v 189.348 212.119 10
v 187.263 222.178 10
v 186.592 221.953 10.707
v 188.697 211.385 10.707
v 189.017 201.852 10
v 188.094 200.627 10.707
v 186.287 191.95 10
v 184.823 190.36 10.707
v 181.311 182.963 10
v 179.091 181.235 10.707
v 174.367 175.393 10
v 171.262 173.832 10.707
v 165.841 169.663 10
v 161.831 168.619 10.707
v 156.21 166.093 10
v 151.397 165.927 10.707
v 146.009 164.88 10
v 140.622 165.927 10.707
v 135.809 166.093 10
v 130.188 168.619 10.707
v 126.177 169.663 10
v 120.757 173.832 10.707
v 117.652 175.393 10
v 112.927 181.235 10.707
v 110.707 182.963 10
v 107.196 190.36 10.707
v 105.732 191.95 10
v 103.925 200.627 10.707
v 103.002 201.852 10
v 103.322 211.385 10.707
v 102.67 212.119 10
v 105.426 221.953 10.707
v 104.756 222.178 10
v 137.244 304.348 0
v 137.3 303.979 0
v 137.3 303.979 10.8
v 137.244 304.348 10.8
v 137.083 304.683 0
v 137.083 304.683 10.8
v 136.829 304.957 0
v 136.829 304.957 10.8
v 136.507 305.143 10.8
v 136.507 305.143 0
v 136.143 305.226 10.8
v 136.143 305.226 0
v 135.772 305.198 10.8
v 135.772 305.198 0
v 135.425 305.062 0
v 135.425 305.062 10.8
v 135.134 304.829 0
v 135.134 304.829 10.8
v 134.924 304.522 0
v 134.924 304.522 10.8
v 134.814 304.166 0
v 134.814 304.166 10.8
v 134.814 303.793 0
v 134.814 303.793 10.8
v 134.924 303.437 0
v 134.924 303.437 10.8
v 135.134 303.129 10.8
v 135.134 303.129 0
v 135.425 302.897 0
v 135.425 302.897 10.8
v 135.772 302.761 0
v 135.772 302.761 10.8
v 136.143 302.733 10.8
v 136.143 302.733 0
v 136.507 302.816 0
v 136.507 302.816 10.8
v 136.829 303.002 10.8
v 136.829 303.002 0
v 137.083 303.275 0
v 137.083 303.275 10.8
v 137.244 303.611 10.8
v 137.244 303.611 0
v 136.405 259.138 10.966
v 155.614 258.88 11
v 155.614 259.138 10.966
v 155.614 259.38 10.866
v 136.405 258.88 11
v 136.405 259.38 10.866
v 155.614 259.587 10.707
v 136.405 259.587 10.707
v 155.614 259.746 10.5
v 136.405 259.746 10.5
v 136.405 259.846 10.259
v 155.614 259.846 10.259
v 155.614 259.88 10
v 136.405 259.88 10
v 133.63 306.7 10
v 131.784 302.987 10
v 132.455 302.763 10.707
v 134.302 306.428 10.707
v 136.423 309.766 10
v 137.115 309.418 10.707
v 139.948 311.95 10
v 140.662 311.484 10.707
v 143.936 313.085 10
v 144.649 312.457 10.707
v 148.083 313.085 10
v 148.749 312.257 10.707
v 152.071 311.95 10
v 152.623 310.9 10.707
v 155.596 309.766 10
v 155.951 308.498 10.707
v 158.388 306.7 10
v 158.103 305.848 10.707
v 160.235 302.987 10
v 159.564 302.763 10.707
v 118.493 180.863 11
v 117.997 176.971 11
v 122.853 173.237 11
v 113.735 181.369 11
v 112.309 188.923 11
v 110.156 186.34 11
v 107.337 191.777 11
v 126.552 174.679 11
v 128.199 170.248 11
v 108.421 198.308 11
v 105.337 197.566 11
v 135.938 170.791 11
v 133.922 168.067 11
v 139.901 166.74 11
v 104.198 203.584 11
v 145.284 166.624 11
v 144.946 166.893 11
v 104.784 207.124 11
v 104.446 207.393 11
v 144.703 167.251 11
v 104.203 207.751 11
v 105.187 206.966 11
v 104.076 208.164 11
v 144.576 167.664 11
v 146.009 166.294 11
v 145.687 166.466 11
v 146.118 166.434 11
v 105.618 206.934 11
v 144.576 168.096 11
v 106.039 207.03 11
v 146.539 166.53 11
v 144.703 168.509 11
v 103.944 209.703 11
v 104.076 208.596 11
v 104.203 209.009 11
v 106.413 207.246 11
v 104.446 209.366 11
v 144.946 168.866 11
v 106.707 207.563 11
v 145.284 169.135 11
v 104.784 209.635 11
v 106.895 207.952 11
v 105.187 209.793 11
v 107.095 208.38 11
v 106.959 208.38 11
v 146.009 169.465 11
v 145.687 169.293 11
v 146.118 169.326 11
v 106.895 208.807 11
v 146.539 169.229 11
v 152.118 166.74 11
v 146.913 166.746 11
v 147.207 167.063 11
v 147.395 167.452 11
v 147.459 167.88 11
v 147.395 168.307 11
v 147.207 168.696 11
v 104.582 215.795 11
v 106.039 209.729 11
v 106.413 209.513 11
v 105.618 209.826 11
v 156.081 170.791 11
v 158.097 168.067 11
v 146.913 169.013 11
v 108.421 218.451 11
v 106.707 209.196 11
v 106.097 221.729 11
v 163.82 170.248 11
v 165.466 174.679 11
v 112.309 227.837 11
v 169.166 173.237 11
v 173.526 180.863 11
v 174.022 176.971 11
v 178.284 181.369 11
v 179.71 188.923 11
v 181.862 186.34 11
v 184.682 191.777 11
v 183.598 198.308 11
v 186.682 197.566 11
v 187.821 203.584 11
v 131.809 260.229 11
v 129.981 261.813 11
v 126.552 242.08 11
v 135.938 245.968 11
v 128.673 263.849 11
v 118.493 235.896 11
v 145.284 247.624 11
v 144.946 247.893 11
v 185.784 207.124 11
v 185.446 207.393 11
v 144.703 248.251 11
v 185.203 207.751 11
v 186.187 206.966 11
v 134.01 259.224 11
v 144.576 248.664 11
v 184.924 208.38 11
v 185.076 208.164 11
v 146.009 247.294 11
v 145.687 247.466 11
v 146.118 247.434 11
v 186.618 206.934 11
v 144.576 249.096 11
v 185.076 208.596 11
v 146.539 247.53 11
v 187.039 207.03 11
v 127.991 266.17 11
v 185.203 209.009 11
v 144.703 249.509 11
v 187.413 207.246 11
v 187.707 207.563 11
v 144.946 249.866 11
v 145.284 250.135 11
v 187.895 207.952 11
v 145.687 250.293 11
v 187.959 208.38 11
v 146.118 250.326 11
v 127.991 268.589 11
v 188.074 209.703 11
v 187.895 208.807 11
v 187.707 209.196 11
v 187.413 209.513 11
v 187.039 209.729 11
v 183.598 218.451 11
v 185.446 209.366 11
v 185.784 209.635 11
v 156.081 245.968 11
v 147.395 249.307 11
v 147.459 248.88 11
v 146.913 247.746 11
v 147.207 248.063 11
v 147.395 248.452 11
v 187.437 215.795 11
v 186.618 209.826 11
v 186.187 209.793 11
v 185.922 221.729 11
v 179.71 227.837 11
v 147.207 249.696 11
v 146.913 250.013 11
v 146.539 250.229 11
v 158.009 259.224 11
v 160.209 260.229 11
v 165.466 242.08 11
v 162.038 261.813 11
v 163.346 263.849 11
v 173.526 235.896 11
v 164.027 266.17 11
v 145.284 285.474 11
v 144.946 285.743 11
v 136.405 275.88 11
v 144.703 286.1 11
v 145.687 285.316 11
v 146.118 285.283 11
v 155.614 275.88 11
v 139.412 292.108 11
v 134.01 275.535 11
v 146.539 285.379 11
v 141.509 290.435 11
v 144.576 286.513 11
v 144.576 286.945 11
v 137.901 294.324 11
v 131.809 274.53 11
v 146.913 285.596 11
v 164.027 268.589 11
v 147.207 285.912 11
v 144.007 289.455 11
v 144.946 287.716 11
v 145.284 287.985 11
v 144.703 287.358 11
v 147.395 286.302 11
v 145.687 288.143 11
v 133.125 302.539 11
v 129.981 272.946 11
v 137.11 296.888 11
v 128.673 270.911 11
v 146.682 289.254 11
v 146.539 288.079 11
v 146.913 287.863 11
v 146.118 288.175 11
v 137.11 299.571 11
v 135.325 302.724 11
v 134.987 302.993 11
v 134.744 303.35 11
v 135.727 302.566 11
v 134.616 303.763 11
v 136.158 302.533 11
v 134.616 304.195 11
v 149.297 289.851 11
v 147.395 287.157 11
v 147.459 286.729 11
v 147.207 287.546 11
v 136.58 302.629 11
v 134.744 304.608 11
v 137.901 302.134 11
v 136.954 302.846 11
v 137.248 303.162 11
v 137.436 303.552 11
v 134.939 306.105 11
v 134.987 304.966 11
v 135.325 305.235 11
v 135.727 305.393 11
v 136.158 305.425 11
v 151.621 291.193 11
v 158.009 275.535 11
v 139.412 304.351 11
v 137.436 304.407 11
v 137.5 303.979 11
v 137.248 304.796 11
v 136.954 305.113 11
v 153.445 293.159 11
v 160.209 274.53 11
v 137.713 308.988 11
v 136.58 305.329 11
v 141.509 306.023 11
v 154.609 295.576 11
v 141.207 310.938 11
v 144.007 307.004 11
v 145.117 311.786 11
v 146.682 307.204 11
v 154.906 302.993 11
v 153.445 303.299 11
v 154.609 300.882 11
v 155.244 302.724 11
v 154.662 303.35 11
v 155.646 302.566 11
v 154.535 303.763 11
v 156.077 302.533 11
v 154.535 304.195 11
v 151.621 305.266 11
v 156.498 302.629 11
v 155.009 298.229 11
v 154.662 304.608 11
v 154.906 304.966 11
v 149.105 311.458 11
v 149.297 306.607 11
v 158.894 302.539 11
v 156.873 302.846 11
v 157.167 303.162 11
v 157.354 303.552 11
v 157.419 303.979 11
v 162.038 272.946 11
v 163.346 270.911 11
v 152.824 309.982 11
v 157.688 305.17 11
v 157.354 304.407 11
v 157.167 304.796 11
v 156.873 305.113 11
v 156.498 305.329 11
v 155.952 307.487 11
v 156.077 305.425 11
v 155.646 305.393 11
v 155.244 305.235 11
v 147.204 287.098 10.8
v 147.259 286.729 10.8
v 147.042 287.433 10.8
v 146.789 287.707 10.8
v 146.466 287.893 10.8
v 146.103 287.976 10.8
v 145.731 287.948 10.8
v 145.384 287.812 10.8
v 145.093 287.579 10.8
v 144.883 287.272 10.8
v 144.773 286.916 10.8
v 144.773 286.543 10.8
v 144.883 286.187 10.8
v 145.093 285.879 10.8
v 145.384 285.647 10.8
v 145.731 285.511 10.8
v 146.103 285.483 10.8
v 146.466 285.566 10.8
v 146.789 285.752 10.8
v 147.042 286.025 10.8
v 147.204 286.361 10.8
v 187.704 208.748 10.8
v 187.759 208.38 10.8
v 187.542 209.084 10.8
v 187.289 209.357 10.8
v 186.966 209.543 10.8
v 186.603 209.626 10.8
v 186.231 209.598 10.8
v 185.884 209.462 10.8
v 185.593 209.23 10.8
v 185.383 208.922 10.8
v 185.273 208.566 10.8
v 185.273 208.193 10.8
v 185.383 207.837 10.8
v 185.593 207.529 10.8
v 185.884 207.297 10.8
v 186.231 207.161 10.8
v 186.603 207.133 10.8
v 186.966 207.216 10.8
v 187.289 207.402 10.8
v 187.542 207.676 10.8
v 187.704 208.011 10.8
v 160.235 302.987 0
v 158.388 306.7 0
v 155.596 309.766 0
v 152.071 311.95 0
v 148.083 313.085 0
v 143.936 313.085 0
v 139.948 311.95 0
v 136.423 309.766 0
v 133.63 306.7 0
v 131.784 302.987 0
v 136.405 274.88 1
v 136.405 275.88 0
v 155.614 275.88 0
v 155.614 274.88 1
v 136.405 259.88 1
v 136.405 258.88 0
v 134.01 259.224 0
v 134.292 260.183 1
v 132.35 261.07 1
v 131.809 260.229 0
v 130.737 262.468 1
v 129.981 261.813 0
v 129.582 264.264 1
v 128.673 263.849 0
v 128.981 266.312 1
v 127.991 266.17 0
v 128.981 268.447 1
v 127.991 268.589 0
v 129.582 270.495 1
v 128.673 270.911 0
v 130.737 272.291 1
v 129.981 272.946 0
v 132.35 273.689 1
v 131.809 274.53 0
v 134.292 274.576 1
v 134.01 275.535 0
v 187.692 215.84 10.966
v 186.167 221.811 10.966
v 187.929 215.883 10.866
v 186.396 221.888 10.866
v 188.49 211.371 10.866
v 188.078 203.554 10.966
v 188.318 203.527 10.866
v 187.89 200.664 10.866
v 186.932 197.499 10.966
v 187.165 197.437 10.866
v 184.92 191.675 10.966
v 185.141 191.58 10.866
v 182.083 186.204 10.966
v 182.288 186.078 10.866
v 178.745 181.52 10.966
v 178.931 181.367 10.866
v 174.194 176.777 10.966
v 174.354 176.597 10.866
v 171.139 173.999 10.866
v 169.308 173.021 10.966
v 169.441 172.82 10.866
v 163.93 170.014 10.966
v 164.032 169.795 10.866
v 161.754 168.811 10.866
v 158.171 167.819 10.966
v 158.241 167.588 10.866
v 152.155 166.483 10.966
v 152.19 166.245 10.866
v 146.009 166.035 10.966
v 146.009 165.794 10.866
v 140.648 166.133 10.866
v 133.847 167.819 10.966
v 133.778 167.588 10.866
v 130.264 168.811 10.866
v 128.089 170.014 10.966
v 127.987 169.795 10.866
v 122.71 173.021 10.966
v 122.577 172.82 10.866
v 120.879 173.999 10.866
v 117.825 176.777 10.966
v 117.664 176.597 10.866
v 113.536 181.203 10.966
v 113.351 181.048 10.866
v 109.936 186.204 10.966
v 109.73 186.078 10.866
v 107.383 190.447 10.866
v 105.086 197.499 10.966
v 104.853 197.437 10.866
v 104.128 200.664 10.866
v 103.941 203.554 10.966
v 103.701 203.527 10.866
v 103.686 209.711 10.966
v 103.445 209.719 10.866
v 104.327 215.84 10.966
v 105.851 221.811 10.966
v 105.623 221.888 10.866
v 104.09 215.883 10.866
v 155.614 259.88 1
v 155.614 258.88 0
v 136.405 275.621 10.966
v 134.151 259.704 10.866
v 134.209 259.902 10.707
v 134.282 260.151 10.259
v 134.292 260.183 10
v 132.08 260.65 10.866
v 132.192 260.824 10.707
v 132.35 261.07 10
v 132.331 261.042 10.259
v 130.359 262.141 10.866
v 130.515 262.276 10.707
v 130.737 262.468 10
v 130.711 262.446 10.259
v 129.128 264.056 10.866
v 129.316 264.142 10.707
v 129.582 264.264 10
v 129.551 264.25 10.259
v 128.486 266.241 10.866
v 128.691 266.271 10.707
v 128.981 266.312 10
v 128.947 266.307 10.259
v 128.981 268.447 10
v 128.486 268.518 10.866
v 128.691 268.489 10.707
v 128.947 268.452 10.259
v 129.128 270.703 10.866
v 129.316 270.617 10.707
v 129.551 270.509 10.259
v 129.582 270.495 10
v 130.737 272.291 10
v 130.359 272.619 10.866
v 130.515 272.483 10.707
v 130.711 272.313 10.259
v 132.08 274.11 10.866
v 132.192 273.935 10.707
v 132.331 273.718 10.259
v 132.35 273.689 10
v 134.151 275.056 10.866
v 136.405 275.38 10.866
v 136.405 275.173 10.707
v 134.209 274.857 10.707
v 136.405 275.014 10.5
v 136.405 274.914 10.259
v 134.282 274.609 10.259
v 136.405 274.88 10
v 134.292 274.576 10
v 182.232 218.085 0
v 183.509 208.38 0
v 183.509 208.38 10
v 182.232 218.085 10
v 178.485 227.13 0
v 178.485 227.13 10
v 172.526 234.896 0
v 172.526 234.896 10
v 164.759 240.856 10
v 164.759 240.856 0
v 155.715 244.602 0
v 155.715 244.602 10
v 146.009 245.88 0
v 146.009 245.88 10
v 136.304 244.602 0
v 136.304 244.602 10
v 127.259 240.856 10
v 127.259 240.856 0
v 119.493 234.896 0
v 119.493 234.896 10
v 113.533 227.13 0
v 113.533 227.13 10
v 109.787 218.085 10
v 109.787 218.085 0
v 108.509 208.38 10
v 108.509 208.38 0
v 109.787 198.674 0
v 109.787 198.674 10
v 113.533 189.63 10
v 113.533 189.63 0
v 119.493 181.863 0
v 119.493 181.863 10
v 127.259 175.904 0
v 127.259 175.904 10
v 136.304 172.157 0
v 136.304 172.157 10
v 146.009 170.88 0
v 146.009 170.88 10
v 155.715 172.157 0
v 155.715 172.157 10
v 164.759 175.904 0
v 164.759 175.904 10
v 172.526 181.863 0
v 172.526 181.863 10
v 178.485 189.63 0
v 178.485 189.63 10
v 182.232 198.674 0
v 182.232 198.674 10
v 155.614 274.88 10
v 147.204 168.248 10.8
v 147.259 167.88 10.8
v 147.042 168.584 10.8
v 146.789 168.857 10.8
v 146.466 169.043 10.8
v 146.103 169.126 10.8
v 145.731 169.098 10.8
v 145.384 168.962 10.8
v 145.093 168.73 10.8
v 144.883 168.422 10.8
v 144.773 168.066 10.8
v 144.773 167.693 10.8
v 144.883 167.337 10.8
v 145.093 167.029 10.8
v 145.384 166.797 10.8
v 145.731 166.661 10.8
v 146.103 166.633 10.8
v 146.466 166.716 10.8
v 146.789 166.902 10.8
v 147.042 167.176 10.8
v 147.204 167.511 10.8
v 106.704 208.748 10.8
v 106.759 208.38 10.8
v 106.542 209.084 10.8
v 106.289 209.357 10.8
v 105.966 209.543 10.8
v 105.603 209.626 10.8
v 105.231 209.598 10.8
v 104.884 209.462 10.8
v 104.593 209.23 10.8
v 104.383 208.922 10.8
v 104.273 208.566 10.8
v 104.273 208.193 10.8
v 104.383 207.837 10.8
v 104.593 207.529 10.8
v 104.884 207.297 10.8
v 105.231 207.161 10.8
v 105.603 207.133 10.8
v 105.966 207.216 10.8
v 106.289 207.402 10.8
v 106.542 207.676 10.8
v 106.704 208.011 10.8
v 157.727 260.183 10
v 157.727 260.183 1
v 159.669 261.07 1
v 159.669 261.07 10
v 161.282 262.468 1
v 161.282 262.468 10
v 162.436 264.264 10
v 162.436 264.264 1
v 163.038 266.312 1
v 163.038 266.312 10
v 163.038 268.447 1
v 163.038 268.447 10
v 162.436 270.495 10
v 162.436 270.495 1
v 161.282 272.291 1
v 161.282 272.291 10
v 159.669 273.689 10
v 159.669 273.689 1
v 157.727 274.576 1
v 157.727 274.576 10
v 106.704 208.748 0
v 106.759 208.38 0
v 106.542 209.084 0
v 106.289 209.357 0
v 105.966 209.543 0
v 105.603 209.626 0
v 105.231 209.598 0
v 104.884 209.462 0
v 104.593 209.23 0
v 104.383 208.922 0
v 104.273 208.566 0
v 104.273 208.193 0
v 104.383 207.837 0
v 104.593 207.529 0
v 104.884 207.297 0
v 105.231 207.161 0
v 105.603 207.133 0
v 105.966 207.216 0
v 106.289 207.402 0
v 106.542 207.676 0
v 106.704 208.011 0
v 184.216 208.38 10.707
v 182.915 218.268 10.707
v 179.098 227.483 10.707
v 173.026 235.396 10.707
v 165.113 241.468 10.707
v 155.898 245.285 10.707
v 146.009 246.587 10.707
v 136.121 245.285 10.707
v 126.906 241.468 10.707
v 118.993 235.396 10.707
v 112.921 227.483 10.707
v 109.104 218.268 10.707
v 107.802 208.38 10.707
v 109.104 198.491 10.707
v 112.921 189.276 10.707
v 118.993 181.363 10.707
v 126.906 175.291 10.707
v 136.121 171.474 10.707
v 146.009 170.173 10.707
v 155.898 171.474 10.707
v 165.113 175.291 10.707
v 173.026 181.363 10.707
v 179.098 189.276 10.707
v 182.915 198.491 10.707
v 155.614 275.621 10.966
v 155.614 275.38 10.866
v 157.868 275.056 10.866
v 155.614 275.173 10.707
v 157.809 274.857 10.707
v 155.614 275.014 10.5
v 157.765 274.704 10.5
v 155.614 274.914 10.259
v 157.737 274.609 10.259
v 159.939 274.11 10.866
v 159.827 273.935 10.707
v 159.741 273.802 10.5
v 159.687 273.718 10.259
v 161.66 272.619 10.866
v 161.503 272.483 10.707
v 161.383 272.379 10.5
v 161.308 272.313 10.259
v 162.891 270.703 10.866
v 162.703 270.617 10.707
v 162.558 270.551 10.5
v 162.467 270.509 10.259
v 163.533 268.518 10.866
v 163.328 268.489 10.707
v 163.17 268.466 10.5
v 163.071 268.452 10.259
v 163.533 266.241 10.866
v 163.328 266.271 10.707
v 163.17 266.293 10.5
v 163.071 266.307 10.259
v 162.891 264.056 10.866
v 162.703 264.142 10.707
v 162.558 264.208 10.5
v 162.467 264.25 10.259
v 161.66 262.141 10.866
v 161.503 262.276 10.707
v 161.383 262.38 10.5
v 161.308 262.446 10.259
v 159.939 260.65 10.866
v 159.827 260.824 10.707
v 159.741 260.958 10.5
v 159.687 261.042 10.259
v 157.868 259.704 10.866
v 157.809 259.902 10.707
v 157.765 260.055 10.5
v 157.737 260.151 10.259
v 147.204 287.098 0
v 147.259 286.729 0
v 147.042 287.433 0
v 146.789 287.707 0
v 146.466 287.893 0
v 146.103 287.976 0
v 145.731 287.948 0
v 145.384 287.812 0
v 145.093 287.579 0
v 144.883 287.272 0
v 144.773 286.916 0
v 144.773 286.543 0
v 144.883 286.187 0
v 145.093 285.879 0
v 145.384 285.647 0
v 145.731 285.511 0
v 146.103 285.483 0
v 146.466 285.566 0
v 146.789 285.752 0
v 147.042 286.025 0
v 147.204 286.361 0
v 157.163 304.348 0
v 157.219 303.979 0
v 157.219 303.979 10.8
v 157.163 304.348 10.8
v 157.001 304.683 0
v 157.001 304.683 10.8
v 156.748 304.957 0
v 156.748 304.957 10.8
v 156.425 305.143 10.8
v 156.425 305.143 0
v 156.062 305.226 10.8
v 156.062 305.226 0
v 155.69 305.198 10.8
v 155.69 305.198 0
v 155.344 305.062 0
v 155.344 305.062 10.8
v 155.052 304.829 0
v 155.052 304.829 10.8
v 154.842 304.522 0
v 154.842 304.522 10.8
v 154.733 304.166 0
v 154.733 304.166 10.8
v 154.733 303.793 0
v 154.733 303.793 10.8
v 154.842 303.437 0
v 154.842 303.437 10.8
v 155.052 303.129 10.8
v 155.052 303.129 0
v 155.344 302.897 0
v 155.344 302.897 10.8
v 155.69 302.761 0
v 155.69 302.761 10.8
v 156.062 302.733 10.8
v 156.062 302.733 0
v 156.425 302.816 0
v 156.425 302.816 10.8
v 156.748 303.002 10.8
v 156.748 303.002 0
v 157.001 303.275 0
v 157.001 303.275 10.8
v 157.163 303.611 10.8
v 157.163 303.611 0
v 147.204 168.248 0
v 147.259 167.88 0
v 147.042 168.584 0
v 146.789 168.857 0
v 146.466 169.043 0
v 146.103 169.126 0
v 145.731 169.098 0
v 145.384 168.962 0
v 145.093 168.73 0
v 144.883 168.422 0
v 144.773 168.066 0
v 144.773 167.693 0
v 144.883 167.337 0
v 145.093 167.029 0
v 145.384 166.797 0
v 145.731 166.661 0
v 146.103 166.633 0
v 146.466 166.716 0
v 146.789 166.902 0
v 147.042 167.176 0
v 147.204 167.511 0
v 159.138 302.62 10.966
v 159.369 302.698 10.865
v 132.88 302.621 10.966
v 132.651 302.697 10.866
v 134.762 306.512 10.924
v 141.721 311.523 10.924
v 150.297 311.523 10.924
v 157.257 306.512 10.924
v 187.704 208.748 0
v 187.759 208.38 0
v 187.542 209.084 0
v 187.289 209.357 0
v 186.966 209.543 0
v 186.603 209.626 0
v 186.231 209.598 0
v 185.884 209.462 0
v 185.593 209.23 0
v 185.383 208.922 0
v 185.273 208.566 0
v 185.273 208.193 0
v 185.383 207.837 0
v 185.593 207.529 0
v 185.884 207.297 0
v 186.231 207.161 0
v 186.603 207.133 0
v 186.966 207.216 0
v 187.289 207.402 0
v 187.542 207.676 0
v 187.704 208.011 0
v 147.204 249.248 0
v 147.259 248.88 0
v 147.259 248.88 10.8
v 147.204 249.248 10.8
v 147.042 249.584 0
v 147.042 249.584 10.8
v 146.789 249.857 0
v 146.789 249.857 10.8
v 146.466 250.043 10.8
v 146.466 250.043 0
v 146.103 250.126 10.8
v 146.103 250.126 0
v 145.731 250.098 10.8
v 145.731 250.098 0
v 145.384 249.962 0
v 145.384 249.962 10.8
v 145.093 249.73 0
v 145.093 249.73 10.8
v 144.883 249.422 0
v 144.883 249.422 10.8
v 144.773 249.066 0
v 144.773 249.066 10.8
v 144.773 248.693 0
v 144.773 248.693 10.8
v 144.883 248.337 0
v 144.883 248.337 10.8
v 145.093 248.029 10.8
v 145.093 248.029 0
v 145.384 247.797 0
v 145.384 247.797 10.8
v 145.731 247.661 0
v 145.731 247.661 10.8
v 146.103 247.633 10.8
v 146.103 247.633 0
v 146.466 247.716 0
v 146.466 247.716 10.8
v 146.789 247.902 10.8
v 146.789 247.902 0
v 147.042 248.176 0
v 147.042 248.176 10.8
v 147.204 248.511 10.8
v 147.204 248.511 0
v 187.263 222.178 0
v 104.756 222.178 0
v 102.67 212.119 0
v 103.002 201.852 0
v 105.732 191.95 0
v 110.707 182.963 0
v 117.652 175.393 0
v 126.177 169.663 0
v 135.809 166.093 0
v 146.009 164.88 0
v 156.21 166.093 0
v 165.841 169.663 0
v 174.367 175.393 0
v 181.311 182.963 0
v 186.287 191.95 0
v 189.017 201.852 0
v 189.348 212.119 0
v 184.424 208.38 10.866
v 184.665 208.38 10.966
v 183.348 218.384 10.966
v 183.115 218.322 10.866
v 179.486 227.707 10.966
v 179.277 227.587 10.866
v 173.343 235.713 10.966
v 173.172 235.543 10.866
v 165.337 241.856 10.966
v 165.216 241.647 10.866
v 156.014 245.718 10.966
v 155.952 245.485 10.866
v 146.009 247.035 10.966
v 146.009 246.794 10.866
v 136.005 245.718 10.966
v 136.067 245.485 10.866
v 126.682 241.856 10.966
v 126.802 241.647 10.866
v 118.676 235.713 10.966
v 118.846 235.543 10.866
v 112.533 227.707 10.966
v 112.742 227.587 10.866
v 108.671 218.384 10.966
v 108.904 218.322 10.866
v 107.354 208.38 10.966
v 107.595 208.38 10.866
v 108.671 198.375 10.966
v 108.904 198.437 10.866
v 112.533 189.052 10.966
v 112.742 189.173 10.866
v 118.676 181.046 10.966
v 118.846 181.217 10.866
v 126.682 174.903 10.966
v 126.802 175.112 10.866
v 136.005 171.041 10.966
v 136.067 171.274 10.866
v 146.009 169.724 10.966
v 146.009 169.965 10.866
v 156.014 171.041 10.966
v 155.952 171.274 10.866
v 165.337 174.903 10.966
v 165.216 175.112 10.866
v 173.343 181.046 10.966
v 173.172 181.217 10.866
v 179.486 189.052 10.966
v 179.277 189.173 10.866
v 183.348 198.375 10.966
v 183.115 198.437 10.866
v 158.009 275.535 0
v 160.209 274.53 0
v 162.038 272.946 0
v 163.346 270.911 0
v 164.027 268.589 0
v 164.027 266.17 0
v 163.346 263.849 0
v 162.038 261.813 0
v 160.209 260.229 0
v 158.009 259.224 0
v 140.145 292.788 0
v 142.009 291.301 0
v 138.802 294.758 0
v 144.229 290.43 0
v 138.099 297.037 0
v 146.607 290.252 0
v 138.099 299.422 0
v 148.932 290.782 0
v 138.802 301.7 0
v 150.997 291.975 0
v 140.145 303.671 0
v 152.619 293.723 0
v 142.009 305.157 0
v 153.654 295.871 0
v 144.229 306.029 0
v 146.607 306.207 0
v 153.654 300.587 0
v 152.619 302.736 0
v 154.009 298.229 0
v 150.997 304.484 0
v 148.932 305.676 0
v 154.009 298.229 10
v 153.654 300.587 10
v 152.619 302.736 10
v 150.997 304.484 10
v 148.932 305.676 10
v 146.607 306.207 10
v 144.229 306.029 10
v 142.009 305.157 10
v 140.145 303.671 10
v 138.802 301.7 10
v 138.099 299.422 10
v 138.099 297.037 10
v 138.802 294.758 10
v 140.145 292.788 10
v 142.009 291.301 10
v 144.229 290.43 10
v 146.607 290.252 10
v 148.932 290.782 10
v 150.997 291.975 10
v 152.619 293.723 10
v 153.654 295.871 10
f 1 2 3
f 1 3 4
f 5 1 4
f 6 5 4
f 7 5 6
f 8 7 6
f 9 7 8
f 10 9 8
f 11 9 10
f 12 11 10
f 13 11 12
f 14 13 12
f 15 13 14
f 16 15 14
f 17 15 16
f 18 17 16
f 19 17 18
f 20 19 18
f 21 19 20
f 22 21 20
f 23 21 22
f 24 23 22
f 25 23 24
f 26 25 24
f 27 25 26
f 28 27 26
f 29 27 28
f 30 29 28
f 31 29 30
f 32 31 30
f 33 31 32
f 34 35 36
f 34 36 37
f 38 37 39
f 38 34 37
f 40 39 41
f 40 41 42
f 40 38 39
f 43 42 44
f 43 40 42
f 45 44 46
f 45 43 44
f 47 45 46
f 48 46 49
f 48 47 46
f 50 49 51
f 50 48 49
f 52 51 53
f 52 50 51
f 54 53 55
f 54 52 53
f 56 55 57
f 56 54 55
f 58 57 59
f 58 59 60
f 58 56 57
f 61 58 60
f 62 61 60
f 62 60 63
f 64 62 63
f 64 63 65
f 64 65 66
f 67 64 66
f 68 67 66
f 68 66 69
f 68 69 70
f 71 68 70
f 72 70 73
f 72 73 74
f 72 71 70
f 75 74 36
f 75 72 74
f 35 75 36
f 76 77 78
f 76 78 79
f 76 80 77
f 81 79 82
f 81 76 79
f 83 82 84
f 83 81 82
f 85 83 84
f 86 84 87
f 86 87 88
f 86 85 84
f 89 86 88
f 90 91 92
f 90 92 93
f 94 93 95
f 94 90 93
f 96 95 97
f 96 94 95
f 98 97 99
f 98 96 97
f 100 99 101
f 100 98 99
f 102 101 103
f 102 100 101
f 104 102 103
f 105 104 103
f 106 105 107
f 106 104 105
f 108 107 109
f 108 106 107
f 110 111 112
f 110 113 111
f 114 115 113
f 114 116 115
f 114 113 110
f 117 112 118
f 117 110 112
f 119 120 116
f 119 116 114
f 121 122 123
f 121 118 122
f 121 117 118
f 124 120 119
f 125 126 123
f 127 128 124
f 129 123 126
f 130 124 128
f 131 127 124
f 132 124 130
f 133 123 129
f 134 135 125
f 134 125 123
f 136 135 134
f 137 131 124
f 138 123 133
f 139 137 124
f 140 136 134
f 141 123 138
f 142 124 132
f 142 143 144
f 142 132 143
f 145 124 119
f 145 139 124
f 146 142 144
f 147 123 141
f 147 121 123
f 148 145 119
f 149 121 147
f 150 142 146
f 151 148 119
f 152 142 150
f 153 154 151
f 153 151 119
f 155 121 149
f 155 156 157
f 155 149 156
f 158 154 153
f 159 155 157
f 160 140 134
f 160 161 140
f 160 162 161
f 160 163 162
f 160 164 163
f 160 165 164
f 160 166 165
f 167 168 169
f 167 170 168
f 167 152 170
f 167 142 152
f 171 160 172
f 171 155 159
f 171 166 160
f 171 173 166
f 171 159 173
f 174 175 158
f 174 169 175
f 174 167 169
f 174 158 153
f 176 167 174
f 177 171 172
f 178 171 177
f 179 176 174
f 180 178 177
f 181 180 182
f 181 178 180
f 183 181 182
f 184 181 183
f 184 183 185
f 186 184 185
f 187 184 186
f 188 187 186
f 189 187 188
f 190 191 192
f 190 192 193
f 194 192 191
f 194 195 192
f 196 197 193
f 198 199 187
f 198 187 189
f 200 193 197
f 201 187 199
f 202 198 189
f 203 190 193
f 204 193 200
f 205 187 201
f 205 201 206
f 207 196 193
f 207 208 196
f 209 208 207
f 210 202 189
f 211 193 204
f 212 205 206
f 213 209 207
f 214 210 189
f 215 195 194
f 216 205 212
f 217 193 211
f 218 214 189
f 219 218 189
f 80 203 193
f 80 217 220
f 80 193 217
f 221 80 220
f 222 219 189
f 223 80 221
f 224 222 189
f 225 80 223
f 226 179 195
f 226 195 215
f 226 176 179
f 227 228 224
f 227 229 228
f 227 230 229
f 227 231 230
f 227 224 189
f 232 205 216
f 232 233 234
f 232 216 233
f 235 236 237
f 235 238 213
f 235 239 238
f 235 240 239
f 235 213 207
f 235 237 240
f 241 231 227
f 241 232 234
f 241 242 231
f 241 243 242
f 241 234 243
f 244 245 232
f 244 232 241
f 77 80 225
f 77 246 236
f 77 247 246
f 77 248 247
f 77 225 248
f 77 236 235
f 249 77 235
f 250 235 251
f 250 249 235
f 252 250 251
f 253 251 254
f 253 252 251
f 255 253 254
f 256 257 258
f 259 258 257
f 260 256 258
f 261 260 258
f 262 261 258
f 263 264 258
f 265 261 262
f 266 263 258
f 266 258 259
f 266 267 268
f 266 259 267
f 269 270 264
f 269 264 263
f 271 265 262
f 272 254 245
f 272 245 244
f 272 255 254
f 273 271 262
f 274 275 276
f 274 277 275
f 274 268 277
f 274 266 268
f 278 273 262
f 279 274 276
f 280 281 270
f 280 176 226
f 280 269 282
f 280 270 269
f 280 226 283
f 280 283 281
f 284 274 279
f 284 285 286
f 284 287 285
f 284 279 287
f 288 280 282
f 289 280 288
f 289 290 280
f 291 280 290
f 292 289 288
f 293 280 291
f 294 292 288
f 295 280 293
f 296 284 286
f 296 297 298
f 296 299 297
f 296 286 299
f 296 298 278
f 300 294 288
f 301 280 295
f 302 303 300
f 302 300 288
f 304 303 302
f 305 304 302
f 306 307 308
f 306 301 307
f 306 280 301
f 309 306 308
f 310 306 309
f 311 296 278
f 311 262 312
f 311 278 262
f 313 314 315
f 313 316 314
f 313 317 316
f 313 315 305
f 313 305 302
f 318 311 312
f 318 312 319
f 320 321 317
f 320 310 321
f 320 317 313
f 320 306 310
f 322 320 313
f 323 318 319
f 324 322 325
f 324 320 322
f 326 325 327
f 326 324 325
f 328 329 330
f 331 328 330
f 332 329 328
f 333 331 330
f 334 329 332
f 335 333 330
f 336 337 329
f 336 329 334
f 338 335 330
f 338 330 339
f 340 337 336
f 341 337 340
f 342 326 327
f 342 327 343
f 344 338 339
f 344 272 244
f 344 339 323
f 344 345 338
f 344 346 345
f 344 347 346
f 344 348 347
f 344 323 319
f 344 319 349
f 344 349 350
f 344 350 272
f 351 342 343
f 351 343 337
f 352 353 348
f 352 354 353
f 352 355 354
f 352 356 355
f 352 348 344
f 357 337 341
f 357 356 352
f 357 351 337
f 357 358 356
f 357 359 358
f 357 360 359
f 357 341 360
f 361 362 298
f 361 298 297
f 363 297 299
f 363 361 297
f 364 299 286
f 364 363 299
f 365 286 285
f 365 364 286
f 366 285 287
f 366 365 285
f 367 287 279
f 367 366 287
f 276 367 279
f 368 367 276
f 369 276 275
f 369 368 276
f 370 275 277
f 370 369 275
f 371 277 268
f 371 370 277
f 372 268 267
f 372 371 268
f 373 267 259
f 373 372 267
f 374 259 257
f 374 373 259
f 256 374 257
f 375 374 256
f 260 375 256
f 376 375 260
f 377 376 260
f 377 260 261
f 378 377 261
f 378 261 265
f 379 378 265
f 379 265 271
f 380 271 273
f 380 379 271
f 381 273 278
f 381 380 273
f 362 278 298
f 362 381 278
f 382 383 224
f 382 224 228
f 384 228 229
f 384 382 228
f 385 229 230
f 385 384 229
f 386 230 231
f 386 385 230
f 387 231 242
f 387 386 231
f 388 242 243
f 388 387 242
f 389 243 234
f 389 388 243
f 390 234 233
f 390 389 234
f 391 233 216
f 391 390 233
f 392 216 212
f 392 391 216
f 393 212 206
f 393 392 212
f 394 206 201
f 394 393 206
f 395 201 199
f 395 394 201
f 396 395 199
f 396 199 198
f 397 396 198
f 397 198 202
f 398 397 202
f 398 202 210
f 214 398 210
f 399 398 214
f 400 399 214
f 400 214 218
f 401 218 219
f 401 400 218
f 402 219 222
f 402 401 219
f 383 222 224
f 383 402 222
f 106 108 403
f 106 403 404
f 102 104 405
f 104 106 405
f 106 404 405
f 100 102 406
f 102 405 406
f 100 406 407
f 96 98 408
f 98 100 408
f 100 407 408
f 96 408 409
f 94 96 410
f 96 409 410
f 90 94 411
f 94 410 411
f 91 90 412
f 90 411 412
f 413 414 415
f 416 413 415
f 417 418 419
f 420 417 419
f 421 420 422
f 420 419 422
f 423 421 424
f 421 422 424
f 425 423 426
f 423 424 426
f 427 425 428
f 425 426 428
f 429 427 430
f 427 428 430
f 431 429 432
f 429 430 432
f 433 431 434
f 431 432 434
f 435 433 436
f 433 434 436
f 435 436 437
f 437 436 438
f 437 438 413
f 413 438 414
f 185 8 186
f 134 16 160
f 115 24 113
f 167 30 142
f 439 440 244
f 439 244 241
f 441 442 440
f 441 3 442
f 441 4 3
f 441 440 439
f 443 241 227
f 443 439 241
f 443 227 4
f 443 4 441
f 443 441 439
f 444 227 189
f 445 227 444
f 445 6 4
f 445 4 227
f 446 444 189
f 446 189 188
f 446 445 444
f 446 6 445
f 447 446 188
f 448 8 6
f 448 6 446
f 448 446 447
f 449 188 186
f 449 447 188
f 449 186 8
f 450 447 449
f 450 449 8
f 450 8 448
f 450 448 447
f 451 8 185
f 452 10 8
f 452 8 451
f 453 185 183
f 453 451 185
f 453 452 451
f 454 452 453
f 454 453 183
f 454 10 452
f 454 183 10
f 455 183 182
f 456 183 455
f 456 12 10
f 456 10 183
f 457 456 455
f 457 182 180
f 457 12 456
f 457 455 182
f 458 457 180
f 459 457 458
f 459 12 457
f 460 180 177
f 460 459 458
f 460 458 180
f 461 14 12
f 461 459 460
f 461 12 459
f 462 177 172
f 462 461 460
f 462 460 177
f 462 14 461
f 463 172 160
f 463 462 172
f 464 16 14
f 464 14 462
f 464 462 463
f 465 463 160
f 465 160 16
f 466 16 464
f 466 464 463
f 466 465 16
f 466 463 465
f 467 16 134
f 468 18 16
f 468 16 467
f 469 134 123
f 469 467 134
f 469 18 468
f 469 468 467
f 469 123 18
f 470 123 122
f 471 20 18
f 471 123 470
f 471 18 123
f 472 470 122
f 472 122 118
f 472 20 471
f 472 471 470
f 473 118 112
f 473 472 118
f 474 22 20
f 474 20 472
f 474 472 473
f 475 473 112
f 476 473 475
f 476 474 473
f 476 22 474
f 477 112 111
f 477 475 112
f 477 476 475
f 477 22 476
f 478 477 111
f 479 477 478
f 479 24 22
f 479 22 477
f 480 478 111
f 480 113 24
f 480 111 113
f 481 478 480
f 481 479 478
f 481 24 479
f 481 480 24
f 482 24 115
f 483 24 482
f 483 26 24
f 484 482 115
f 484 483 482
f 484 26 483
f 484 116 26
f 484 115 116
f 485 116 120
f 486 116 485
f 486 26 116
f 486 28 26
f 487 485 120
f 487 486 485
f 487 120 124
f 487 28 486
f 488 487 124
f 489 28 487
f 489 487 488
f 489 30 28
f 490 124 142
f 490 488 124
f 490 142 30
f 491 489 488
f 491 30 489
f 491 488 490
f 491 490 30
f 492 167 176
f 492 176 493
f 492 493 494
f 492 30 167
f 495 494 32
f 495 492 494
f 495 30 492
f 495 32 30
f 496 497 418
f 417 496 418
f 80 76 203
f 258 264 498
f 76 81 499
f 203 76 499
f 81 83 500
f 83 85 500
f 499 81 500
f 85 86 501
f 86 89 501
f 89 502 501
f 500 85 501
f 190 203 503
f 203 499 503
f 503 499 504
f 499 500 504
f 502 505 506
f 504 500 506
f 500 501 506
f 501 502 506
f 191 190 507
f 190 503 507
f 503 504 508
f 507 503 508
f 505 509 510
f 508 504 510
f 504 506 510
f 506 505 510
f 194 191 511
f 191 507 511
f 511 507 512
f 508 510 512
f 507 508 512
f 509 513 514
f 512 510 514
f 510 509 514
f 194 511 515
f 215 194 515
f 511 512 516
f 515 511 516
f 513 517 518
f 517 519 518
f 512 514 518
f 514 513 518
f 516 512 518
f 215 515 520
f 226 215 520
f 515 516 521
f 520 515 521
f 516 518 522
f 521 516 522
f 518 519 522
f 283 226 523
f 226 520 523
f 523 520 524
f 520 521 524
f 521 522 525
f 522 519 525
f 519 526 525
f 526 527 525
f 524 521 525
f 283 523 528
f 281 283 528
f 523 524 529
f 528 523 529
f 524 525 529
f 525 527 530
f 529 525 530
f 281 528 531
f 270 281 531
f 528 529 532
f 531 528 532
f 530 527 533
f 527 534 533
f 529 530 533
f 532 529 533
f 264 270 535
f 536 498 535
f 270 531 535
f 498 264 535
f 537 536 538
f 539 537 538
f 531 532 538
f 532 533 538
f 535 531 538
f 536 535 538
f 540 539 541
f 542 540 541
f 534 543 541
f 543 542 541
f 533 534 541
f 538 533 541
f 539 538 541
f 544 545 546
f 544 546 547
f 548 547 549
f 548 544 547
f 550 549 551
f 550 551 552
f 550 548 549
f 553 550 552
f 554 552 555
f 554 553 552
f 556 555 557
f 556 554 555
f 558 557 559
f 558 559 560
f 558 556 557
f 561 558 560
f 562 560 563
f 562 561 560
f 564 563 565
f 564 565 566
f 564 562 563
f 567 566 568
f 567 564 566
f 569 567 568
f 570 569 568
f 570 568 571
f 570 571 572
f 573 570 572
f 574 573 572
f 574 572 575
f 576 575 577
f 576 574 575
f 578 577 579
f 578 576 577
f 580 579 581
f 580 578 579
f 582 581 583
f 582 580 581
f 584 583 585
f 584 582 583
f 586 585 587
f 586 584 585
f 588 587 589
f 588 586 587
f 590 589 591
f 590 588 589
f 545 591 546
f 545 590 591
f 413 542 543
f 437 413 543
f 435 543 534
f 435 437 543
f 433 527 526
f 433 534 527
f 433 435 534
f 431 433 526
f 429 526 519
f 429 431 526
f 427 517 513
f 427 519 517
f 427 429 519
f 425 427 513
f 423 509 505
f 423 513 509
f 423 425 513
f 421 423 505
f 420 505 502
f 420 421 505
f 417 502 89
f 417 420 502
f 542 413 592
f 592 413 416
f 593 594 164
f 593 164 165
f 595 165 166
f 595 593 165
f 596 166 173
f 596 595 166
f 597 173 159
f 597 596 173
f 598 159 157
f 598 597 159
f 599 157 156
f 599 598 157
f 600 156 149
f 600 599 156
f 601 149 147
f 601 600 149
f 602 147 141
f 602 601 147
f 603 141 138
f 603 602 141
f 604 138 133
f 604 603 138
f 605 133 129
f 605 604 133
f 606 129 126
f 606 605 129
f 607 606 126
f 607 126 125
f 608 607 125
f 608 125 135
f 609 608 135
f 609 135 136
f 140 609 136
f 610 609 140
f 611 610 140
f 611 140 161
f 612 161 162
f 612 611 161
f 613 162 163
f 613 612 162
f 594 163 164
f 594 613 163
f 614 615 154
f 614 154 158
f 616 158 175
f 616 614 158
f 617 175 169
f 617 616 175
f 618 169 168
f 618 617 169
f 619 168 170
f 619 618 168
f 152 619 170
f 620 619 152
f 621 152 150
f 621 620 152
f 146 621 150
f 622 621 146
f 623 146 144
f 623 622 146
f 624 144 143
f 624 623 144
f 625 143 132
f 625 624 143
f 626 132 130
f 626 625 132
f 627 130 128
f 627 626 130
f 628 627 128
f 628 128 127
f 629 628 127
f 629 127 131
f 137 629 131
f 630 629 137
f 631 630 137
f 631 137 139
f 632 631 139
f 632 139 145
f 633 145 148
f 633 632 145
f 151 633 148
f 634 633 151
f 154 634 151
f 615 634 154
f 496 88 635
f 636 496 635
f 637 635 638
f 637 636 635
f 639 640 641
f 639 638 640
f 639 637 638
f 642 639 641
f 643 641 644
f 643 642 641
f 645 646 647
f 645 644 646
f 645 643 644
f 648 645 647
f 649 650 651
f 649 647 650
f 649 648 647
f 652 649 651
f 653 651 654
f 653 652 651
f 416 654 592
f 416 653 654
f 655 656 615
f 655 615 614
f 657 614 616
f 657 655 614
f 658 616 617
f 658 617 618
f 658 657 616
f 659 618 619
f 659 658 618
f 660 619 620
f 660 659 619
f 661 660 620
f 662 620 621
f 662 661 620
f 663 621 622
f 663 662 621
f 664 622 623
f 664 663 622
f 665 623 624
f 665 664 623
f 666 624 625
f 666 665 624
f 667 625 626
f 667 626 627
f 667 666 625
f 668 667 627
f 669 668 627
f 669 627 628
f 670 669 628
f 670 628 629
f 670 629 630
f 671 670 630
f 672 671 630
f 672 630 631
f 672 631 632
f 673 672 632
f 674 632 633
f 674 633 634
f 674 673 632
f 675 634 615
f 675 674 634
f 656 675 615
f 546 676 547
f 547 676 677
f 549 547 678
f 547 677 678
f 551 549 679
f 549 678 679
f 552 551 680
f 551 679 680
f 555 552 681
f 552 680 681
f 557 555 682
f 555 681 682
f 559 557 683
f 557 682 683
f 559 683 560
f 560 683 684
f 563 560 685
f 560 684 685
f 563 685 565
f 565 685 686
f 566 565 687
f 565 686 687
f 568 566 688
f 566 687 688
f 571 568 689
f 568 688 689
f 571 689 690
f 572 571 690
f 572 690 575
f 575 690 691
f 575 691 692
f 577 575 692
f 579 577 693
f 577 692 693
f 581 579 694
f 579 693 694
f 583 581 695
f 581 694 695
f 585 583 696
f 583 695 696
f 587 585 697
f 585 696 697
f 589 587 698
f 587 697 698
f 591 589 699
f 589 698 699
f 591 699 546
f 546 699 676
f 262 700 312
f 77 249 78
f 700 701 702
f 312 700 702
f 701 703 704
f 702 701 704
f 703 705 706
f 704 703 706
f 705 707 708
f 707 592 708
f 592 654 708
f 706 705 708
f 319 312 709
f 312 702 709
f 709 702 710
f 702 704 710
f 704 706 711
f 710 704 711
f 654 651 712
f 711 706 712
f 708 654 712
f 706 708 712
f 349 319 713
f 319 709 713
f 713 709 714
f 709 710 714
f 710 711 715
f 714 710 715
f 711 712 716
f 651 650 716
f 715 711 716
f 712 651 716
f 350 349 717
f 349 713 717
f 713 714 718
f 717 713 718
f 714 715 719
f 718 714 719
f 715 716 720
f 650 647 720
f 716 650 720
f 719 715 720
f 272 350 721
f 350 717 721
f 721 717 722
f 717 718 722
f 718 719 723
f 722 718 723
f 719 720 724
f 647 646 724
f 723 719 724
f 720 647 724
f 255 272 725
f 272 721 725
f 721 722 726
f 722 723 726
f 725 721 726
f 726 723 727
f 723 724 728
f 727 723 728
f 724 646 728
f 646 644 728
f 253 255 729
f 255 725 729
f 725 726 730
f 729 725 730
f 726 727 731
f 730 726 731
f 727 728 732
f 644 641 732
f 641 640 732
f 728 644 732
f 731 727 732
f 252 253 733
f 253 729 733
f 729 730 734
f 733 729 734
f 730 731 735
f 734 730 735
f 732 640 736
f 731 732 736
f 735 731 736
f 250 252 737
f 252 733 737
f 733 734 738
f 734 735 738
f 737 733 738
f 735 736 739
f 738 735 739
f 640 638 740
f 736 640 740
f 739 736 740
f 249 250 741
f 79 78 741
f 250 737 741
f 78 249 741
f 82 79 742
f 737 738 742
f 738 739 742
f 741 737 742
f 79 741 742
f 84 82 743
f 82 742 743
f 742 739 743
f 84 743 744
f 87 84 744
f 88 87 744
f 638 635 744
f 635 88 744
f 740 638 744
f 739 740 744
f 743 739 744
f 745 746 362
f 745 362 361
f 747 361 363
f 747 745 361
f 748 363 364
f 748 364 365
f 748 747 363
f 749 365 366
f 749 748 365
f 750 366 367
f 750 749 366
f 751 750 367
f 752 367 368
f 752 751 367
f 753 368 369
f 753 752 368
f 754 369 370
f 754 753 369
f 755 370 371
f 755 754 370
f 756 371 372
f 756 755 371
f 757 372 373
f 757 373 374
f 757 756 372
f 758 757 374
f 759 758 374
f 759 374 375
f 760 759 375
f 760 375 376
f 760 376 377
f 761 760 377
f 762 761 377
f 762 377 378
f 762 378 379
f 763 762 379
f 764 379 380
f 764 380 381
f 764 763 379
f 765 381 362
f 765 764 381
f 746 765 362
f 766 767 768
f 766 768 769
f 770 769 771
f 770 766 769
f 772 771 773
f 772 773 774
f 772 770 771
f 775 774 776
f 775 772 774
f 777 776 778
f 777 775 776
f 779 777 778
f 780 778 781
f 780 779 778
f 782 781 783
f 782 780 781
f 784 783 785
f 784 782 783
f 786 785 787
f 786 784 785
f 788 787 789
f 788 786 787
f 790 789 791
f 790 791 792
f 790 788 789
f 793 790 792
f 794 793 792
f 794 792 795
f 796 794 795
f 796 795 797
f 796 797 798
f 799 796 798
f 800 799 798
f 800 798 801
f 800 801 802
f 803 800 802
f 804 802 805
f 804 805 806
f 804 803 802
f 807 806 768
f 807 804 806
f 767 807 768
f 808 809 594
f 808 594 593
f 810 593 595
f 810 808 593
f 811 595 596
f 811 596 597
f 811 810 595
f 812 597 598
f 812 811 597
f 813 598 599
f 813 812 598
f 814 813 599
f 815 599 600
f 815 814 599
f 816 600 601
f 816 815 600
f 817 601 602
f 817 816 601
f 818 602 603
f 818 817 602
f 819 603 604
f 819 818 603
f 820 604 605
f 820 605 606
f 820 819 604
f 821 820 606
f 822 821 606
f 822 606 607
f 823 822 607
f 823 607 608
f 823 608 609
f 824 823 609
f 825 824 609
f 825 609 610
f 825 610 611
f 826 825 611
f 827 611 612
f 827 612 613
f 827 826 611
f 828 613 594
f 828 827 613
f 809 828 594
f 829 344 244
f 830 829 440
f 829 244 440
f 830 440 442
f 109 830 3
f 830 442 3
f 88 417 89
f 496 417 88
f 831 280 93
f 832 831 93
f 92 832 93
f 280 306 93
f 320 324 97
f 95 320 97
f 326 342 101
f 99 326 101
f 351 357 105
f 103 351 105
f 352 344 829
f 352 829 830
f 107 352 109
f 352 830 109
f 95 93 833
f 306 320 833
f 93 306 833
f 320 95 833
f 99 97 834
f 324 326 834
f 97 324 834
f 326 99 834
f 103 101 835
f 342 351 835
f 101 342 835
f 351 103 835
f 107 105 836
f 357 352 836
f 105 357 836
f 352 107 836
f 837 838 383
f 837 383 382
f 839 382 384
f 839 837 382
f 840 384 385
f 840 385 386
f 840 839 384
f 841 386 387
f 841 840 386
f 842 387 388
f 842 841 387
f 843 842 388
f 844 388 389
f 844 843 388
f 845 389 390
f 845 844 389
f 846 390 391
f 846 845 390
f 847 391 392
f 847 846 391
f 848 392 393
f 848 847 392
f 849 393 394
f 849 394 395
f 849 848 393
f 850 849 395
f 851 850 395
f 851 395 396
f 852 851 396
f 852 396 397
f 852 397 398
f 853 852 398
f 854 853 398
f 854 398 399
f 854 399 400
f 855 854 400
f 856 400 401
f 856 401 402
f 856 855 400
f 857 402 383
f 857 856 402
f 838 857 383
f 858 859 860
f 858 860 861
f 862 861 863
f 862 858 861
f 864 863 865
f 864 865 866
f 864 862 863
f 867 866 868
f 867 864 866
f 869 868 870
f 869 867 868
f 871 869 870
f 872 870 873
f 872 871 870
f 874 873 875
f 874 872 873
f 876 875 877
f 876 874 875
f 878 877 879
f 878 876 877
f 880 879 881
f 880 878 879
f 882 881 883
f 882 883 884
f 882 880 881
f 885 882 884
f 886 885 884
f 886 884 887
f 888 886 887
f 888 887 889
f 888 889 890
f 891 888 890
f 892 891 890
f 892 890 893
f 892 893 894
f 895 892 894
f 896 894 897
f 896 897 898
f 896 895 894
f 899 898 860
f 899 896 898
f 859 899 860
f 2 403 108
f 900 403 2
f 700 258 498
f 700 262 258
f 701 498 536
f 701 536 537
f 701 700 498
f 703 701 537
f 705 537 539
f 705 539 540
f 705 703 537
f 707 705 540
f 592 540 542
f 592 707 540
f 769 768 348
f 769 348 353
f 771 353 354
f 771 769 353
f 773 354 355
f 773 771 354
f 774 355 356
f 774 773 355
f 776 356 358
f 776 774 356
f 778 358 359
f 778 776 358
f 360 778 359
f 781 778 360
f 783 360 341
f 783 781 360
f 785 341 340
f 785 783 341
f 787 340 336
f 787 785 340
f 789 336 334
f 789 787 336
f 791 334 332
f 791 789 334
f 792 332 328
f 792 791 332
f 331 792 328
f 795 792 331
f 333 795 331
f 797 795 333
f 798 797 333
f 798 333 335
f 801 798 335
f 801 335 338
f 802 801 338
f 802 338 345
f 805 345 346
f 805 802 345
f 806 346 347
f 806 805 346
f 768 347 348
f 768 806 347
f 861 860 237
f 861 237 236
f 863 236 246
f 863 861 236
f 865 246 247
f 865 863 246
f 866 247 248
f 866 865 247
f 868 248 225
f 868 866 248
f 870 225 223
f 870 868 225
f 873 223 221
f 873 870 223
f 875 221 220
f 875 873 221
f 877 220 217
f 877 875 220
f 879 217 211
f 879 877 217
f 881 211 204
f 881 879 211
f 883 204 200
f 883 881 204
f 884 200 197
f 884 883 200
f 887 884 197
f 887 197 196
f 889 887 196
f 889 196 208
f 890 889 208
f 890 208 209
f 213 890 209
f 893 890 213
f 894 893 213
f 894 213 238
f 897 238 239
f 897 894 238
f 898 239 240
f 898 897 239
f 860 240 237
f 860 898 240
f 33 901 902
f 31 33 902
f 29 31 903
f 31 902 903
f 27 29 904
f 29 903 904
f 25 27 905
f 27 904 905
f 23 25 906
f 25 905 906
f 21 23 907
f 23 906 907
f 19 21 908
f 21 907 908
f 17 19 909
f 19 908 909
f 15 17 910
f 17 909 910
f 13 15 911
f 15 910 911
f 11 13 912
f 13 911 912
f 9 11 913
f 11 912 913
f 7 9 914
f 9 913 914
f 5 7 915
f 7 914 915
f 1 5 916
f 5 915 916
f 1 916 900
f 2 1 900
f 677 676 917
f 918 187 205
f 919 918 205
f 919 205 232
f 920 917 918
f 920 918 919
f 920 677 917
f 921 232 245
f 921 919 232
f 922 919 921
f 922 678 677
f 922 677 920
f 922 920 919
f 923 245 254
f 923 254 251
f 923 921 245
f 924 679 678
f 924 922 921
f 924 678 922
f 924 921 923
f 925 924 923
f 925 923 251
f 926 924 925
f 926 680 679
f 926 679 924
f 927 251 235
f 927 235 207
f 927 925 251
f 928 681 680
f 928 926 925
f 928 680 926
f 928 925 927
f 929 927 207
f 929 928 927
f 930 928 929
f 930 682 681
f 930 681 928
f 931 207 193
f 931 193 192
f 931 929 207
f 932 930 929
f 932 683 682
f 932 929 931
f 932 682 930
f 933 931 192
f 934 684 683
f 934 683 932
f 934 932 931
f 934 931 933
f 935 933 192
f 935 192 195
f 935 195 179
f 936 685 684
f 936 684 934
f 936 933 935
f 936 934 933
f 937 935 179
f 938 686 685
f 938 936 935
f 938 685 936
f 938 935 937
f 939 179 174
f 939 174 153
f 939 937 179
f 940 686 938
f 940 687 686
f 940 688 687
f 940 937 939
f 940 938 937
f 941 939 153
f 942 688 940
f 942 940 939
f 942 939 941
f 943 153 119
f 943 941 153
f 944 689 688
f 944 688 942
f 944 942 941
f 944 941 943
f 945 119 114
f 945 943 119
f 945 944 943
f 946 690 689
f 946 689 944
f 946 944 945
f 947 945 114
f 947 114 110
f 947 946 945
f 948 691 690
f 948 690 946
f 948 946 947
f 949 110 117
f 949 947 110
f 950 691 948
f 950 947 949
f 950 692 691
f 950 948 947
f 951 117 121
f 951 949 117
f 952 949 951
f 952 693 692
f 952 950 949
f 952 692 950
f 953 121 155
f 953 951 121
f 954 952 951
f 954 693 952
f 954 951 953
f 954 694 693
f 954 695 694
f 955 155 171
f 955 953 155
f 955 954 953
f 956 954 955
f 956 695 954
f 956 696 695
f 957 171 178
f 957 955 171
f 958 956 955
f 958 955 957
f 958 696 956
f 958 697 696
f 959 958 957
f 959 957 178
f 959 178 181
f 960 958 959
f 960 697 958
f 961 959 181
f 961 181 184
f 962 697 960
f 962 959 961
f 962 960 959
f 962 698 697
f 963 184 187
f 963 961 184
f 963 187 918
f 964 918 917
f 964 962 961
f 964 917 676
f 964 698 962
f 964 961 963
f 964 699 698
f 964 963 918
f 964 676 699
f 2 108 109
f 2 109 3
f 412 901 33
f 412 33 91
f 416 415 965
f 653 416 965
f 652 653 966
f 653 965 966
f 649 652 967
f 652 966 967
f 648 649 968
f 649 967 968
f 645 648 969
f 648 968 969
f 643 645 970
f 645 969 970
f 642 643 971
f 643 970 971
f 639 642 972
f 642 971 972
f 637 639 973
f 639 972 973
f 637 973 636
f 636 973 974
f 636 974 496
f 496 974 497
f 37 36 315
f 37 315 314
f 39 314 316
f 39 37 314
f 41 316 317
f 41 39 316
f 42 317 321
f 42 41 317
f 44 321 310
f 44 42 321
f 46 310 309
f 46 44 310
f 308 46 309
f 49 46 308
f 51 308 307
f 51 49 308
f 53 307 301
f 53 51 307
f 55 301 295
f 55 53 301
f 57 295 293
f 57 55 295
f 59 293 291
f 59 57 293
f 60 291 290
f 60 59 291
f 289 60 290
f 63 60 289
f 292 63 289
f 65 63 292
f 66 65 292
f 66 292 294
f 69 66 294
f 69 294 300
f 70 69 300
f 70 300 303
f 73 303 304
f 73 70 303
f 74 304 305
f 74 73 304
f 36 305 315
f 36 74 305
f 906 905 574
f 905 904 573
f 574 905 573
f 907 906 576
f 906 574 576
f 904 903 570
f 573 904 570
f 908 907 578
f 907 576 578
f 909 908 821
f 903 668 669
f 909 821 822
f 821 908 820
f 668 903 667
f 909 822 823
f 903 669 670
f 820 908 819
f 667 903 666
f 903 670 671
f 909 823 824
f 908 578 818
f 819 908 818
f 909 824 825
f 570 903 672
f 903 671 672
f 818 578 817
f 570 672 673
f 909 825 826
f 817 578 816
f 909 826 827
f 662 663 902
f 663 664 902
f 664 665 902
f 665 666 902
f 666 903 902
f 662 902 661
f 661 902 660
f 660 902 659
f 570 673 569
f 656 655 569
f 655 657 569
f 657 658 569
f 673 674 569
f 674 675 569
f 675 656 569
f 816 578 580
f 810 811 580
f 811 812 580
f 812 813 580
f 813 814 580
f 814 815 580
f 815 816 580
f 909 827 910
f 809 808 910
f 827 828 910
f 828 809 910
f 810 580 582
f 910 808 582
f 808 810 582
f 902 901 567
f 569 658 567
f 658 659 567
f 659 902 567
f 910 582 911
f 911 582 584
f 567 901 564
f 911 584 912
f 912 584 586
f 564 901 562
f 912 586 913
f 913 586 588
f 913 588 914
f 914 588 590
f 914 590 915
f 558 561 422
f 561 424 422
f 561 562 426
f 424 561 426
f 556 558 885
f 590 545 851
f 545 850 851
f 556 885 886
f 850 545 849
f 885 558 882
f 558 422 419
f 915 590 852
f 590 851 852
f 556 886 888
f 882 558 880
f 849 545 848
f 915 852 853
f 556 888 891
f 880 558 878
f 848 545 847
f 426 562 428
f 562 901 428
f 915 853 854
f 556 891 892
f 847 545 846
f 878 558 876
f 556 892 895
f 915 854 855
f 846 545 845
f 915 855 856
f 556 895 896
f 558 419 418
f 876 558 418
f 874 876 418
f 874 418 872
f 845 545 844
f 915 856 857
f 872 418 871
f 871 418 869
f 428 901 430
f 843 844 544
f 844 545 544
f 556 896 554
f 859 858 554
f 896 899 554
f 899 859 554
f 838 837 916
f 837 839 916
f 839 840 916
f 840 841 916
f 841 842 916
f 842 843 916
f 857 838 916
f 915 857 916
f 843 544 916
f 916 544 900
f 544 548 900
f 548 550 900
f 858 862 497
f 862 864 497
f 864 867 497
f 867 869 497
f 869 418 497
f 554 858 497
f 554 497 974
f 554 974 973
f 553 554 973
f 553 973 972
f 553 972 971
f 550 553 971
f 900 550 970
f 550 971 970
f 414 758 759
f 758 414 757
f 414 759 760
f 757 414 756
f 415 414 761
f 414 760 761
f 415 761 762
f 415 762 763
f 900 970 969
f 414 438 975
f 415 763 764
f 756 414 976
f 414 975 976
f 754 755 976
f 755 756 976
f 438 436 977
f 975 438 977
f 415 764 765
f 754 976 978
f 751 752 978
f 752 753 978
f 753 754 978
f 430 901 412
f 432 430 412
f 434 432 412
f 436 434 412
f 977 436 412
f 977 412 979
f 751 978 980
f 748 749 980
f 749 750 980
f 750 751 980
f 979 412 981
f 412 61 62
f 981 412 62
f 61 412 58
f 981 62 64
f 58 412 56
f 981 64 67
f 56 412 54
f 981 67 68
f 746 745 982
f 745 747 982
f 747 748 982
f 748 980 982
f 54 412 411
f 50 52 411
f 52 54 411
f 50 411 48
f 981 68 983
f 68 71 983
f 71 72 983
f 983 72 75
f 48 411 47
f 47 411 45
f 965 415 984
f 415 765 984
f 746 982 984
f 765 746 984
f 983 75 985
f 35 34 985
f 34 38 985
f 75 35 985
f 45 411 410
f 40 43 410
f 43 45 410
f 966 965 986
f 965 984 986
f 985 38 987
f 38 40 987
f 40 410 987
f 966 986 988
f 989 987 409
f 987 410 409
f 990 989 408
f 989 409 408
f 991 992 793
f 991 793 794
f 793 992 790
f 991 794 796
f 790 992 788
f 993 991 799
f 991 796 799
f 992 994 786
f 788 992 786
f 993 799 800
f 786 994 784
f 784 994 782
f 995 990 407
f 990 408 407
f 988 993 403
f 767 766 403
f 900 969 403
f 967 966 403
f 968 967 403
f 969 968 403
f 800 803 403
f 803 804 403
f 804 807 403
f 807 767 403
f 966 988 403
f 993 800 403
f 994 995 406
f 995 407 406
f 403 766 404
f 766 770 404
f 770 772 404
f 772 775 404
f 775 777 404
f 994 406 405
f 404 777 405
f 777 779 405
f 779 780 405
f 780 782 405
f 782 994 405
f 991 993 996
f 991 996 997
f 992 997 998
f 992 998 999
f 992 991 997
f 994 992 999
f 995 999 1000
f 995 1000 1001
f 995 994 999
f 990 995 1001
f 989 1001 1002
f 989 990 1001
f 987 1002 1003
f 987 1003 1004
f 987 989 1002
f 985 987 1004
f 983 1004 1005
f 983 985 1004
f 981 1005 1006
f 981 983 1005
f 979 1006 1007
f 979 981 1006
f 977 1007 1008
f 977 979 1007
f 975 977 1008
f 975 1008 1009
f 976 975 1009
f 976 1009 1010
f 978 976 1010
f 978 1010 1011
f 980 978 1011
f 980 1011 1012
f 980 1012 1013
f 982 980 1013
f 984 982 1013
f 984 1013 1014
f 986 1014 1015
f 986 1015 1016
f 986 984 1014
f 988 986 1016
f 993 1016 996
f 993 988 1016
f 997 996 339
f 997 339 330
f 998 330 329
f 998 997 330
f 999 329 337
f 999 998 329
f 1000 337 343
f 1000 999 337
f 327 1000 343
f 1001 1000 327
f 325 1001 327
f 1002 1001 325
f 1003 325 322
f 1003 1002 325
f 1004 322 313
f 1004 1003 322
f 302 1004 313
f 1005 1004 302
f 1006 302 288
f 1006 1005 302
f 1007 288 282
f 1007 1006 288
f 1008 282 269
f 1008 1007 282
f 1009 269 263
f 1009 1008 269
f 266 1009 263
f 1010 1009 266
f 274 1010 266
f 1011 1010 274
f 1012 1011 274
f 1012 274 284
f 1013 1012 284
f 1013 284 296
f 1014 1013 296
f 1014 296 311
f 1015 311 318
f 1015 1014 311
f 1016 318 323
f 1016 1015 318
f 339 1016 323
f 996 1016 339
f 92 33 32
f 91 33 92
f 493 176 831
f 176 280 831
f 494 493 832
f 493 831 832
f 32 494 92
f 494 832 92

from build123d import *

# Parameters (mm, degrees)
SKETCH001_R     = 37.5
SKETCH001_R_2   = 8
SKETCH001_R_3   = 1.25
PAD_DEPTH       = 11
CHAMFER_SIZE    = 1
CHAMFER001_SIZE = 1
FILLET_R        = 1
CHAMFER002_SIZE = 0.2
CHAMFER003_SIZE = 1


with BuildPart() as part:
    # Sketch001 → Pad (new body)
    with BuildSketch(Plane.XY):
        with BuildLine():
            ThreePointArc((160.234719, 302.98721), (146.009323, 313.229259), (131.783927, 302.98721))
            Line((104.755674, 222.17773), (131.783927, 302.98721))
            ThreePointArc((104.755674, 222.17773), (146.009323, 164.87967), (187.262972, 222.17773))
            Line((160.234719, 302.98721), (187.262972, 222.17773))
        make_face()
        with Locations((146.009323, 208.37967)):
            Circle(SKETCH001_R, mode=Mode.SUBTRACT)
        with Locations((146.009323, 298.229259)):
            Circle(SKETCH001_R_2, mode=Mode.SUBTRACT)
        with Locations((155.968615, 303.979259)):
            Circle(SKETCH001_R_3, mode=Mode.SUBTRACT)
        with Locations((146.009323, 286.729259)):
            Circle(SKETCH001_R_3, mode=Mode.SUBTRACT)
        with Locations((136.050031, 303.979259)):
            Circle(SKETCH001_R_3, mode=Mode.SUBTRACT)
        with Locations((146.009323, 248.87967)):
            Circle(SKETCH001_R_3, mode=Mode.SUBTRACT)
        with Locations((186.509323, 208.37967)):
            Circle(SKETCH001_R_3, mode=Mode.SUBTRACT)
        with Locations((146.009323, 167.87967)):
            Circle(SKETCH001_R_3, mode=Mode.SUBTRACT)
        with Locations((105.509323, 208.37967)):
            Circle(SKETCH001_R_3, mode=Mode.SUBTRACT)
        with BuildLine():
            ThreePointArc((136.404664, 274.87967), (128.904664, 267.37967), (136.404664, 259.87967))
            Line((136.404664, 259.87967), (155.613982, 259.87967))
            ThreePointArc((155.613982, 259.87967), (163.113982, 267.37967), (155.613982, 274.87967))
            Line((136.404664, 274.87967), (155.613982, 274.87967))
        make_face(mode=Mode.SUBTRACT)
    extrude(amount=PAD_DEPTH)

    # Chamfer
    chamfer_edges = [part.edges().sort_by_distance(p)[0] for p in [
        (108.509323, 208.37967, 11),
        (146.009323, 274.87967, 0),
    ]]
    chamfer(chamfer_edges, length=CHAMFER_SIZE)

    # Chamfer001
    chamfer001_edges = [part.edges().sort_by_distance(p)[0] for p in [
        (173.748846, 262.58247, 11),
    ]]
    chamfer(chamfer001_edges, length=CHAMFER001_SIZE)

    # Fillet
    fillet_edges = [part.edges().sort_by_distance(p)[0] for p in [
        (146.009323, 274.87967, 11),
        (107.509323, 208.37967, 11),
        (119.21816, 262.265273, 11),
        (146.009323, 165.87967, 11),
    ]]
    fillet(fillet_edges, radius=FILLET_R)

    # Chamfer002
    chamfer002_edges = [part.edges().sort_by_distance(p)[0] for p in [
        (144.759323, 286.729259, 11),
        (134.800031, 303.979259, 11),
        (154.718615, 303.979259, 11),
        (185.259323, 208.37967, 11),
        (144.759323, 167.87967, 11),
        (104.259323, 208.37967, 11),
        (144.759323, 248.87967, 11),
    ]]
    chamfer(chamfer002_edges, length=CHAMFER002_SIZE)

    # Chamfer003
    chamfer003_edges = [part.edges().sort_by_distance(p)[0] for p in [
        (138.009323, 298.229259, 11),
    ]]
    chamfer(chamfer003_edges, length=CHAMFER003_SIZE)


solid = part.part
